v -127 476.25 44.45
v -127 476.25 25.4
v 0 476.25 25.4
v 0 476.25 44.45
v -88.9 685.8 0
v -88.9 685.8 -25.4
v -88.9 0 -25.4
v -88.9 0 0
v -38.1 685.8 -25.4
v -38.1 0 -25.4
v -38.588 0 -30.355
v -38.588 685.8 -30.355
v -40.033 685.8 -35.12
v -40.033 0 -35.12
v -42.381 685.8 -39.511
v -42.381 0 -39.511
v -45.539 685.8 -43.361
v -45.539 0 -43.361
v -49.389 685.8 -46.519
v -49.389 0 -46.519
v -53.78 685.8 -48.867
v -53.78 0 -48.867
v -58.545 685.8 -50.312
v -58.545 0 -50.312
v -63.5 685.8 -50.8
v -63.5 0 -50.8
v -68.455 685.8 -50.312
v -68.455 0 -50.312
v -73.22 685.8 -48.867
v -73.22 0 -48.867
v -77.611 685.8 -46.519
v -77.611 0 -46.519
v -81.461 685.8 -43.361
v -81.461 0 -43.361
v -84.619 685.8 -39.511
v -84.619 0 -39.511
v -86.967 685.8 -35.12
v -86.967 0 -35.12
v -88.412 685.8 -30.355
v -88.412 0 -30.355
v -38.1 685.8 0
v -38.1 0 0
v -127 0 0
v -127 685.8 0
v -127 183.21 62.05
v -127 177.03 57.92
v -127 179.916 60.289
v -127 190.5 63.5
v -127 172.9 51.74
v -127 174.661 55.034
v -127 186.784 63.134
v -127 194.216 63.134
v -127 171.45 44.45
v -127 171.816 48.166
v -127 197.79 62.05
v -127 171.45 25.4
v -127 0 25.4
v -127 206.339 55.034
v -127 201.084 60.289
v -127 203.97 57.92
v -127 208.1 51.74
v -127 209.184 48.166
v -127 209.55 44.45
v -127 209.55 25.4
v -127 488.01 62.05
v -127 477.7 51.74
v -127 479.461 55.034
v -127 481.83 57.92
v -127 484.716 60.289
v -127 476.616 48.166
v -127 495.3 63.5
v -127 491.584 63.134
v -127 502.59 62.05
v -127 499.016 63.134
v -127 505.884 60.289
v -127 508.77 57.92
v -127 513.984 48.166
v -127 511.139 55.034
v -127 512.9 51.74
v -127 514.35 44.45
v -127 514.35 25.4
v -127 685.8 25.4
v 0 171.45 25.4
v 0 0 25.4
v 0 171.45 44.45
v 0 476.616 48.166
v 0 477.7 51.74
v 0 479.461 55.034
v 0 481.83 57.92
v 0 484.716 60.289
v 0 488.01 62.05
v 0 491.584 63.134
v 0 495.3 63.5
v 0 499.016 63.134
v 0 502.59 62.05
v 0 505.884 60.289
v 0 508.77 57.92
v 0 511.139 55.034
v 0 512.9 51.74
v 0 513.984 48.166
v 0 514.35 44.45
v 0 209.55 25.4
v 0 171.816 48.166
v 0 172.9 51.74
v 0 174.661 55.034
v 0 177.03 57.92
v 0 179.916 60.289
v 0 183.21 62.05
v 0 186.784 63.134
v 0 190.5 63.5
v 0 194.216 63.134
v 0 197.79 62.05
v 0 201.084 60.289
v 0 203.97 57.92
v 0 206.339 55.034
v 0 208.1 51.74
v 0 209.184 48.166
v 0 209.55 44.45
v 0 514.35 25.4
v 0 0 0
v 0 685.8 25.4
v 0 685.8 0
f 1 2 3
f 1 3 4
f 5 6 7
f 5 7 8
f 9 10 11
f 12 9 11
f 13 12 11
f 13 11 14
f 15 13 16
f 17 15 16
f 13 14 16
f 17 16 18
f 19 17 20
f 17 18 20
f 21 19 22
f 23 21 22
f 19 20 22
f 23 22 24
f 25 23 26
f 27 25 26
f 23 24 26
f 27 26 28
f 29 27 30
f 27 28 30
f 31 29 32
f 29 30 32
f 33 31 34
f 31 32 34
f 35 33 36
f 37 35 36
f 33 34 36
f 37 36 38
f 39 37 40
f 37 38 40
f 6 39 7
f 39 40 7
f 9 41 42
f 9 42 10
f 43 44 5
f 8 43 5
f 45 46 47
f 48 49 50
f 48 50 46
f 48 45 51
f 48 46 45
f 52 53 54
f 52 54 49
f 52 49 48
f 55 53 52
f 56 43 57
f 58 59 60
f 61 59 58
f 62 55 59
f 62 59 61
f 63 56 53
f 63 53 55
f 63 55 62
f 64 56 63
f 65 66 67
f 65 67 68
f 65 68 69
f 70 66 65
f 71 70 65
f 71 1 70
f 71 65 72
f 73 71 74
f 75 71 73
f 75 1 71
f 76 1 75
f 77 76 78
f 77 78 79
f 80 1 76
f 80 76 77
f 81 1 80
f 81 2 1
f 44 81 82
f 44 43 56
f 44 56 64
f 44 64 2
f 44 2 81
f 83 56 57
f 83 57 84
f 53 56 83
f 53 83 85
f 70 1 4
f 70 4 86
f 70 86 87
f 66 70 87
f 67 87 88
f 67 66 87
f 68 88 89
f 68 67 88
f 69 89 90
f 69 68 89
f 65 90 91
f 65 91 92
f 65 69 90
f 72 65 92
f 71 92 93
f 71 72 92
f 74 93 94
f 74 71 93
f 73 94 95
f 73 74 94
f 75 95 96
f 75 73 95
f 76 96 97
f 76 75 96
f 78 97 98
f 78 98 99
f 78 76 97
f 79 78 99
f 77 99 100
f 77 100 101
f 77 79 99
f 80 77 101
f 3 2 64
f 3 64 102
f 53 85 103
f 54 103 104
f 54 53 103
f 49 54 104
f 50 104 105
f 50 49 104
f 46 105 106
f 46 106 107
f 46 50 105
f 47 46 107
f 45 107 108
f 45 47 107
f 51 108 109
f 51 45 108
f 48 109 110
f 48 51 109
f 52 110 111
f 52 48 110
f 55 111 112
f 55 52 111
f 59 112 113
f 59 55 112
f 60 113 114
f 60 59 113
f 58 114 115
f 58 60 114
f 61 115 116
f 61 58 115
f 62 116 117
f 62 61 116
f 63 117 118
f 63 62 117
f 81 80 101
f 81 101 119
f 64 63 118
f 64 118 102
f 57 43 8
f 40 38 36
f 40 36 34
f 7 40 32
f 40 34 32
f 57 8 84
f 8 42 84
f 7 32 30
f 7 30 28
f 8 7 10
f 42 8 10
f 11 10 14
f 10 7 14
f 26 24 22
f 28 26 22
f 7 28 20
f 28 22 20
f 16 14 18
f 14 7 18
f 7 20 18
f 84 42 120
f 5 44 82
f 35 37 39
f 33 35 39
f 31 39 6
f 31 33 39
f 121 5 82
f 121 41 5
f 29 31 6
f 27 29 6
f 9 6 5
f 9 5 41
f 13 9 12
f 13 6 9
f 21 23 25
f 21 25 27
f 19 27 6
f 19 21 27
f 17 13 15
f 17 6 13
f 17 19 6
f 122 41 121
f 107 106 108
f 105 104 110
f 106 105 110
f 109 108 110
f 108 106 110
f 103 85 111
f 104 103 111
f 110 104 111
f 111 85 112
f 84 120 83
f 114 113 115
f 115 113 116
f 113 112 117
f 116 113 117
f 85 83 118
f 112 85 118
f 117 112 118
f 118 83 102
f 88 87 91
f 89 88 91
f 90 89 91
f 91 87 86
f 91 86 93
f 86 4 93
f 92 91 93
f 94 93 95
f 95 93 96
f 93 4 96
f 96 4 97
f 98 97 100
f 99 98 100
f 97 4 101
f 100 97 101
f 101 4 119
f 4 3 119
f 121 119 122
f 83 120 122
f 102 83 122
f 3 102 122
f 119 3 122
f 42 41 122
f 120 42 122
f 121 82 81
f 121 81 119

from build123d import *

# Parameters (mm, degrees)
SKETCH1_W           = 127
SKETCH1_H           = 685.8
BOSS_EXTRUDE1_DEPTH = 25.4
BOSS_EXTRUDE2_DEPTH = 127
BOSS_EXTRUDE3_DEPTH = 685.8


with BuildPart() as part:
    # Sketch1 → Boss-Extrude1 (new body)
    with BuildSketch(Plane.XY):
        with Locations((-63.5, 342.9)):
            Rectangle(SKETCH1_W, SKETCH1_H)
    extrude(amount=BOSS_EXTRUDE1_DEPTH)

    # Sketch2 → Boss-Extrude2 (add)
    with BuildSketch(Plane.ZY.offset(127)):
        with BuildLine():
            Line((44.45, 514.35), (25.4, 514.35))
            Line((25.4, 514.35), (25.4, 476.25))
            Line((25.4, 476.25), (44.45, 476.25))
            ThreePointArc((44.45, 476.25), (63.5, 495.3), (44.45, 514.35))
        make_face()
        with BuildLine():
            Line((44.45, 209.55), (25.4, 209.55))
            Line((25.4, 209.55), (25.4, 171.45))
            Line((25.4, 171.45), (44.45, 171.45))
            ThreePointArc((44.45, 171.45), (63.5, 190.5), (44.45, 209.55))
        make_face()
    extrude(amount=-BOSS_EXTRUDE2_DEPTH)

    # Sketch3 → Boss-Extrude3 (add)
    with BuildSketch(Plane.XZ):
        with BuildLine():
            Line((-88.9, -25.4), (-88.9, 0))
            Line((-88.9, 0), (-38.1, 0))
            Line((-38.1, 0), (-38.1, -25.4))
            ThreePointArc((-38.1, -25.4), (-63.5, -50.8), (-88.9, -25.4))
        make_face()
    extrude(amount=-BOSS_EXTRUDE3_DEPTH)


solid = part.part
